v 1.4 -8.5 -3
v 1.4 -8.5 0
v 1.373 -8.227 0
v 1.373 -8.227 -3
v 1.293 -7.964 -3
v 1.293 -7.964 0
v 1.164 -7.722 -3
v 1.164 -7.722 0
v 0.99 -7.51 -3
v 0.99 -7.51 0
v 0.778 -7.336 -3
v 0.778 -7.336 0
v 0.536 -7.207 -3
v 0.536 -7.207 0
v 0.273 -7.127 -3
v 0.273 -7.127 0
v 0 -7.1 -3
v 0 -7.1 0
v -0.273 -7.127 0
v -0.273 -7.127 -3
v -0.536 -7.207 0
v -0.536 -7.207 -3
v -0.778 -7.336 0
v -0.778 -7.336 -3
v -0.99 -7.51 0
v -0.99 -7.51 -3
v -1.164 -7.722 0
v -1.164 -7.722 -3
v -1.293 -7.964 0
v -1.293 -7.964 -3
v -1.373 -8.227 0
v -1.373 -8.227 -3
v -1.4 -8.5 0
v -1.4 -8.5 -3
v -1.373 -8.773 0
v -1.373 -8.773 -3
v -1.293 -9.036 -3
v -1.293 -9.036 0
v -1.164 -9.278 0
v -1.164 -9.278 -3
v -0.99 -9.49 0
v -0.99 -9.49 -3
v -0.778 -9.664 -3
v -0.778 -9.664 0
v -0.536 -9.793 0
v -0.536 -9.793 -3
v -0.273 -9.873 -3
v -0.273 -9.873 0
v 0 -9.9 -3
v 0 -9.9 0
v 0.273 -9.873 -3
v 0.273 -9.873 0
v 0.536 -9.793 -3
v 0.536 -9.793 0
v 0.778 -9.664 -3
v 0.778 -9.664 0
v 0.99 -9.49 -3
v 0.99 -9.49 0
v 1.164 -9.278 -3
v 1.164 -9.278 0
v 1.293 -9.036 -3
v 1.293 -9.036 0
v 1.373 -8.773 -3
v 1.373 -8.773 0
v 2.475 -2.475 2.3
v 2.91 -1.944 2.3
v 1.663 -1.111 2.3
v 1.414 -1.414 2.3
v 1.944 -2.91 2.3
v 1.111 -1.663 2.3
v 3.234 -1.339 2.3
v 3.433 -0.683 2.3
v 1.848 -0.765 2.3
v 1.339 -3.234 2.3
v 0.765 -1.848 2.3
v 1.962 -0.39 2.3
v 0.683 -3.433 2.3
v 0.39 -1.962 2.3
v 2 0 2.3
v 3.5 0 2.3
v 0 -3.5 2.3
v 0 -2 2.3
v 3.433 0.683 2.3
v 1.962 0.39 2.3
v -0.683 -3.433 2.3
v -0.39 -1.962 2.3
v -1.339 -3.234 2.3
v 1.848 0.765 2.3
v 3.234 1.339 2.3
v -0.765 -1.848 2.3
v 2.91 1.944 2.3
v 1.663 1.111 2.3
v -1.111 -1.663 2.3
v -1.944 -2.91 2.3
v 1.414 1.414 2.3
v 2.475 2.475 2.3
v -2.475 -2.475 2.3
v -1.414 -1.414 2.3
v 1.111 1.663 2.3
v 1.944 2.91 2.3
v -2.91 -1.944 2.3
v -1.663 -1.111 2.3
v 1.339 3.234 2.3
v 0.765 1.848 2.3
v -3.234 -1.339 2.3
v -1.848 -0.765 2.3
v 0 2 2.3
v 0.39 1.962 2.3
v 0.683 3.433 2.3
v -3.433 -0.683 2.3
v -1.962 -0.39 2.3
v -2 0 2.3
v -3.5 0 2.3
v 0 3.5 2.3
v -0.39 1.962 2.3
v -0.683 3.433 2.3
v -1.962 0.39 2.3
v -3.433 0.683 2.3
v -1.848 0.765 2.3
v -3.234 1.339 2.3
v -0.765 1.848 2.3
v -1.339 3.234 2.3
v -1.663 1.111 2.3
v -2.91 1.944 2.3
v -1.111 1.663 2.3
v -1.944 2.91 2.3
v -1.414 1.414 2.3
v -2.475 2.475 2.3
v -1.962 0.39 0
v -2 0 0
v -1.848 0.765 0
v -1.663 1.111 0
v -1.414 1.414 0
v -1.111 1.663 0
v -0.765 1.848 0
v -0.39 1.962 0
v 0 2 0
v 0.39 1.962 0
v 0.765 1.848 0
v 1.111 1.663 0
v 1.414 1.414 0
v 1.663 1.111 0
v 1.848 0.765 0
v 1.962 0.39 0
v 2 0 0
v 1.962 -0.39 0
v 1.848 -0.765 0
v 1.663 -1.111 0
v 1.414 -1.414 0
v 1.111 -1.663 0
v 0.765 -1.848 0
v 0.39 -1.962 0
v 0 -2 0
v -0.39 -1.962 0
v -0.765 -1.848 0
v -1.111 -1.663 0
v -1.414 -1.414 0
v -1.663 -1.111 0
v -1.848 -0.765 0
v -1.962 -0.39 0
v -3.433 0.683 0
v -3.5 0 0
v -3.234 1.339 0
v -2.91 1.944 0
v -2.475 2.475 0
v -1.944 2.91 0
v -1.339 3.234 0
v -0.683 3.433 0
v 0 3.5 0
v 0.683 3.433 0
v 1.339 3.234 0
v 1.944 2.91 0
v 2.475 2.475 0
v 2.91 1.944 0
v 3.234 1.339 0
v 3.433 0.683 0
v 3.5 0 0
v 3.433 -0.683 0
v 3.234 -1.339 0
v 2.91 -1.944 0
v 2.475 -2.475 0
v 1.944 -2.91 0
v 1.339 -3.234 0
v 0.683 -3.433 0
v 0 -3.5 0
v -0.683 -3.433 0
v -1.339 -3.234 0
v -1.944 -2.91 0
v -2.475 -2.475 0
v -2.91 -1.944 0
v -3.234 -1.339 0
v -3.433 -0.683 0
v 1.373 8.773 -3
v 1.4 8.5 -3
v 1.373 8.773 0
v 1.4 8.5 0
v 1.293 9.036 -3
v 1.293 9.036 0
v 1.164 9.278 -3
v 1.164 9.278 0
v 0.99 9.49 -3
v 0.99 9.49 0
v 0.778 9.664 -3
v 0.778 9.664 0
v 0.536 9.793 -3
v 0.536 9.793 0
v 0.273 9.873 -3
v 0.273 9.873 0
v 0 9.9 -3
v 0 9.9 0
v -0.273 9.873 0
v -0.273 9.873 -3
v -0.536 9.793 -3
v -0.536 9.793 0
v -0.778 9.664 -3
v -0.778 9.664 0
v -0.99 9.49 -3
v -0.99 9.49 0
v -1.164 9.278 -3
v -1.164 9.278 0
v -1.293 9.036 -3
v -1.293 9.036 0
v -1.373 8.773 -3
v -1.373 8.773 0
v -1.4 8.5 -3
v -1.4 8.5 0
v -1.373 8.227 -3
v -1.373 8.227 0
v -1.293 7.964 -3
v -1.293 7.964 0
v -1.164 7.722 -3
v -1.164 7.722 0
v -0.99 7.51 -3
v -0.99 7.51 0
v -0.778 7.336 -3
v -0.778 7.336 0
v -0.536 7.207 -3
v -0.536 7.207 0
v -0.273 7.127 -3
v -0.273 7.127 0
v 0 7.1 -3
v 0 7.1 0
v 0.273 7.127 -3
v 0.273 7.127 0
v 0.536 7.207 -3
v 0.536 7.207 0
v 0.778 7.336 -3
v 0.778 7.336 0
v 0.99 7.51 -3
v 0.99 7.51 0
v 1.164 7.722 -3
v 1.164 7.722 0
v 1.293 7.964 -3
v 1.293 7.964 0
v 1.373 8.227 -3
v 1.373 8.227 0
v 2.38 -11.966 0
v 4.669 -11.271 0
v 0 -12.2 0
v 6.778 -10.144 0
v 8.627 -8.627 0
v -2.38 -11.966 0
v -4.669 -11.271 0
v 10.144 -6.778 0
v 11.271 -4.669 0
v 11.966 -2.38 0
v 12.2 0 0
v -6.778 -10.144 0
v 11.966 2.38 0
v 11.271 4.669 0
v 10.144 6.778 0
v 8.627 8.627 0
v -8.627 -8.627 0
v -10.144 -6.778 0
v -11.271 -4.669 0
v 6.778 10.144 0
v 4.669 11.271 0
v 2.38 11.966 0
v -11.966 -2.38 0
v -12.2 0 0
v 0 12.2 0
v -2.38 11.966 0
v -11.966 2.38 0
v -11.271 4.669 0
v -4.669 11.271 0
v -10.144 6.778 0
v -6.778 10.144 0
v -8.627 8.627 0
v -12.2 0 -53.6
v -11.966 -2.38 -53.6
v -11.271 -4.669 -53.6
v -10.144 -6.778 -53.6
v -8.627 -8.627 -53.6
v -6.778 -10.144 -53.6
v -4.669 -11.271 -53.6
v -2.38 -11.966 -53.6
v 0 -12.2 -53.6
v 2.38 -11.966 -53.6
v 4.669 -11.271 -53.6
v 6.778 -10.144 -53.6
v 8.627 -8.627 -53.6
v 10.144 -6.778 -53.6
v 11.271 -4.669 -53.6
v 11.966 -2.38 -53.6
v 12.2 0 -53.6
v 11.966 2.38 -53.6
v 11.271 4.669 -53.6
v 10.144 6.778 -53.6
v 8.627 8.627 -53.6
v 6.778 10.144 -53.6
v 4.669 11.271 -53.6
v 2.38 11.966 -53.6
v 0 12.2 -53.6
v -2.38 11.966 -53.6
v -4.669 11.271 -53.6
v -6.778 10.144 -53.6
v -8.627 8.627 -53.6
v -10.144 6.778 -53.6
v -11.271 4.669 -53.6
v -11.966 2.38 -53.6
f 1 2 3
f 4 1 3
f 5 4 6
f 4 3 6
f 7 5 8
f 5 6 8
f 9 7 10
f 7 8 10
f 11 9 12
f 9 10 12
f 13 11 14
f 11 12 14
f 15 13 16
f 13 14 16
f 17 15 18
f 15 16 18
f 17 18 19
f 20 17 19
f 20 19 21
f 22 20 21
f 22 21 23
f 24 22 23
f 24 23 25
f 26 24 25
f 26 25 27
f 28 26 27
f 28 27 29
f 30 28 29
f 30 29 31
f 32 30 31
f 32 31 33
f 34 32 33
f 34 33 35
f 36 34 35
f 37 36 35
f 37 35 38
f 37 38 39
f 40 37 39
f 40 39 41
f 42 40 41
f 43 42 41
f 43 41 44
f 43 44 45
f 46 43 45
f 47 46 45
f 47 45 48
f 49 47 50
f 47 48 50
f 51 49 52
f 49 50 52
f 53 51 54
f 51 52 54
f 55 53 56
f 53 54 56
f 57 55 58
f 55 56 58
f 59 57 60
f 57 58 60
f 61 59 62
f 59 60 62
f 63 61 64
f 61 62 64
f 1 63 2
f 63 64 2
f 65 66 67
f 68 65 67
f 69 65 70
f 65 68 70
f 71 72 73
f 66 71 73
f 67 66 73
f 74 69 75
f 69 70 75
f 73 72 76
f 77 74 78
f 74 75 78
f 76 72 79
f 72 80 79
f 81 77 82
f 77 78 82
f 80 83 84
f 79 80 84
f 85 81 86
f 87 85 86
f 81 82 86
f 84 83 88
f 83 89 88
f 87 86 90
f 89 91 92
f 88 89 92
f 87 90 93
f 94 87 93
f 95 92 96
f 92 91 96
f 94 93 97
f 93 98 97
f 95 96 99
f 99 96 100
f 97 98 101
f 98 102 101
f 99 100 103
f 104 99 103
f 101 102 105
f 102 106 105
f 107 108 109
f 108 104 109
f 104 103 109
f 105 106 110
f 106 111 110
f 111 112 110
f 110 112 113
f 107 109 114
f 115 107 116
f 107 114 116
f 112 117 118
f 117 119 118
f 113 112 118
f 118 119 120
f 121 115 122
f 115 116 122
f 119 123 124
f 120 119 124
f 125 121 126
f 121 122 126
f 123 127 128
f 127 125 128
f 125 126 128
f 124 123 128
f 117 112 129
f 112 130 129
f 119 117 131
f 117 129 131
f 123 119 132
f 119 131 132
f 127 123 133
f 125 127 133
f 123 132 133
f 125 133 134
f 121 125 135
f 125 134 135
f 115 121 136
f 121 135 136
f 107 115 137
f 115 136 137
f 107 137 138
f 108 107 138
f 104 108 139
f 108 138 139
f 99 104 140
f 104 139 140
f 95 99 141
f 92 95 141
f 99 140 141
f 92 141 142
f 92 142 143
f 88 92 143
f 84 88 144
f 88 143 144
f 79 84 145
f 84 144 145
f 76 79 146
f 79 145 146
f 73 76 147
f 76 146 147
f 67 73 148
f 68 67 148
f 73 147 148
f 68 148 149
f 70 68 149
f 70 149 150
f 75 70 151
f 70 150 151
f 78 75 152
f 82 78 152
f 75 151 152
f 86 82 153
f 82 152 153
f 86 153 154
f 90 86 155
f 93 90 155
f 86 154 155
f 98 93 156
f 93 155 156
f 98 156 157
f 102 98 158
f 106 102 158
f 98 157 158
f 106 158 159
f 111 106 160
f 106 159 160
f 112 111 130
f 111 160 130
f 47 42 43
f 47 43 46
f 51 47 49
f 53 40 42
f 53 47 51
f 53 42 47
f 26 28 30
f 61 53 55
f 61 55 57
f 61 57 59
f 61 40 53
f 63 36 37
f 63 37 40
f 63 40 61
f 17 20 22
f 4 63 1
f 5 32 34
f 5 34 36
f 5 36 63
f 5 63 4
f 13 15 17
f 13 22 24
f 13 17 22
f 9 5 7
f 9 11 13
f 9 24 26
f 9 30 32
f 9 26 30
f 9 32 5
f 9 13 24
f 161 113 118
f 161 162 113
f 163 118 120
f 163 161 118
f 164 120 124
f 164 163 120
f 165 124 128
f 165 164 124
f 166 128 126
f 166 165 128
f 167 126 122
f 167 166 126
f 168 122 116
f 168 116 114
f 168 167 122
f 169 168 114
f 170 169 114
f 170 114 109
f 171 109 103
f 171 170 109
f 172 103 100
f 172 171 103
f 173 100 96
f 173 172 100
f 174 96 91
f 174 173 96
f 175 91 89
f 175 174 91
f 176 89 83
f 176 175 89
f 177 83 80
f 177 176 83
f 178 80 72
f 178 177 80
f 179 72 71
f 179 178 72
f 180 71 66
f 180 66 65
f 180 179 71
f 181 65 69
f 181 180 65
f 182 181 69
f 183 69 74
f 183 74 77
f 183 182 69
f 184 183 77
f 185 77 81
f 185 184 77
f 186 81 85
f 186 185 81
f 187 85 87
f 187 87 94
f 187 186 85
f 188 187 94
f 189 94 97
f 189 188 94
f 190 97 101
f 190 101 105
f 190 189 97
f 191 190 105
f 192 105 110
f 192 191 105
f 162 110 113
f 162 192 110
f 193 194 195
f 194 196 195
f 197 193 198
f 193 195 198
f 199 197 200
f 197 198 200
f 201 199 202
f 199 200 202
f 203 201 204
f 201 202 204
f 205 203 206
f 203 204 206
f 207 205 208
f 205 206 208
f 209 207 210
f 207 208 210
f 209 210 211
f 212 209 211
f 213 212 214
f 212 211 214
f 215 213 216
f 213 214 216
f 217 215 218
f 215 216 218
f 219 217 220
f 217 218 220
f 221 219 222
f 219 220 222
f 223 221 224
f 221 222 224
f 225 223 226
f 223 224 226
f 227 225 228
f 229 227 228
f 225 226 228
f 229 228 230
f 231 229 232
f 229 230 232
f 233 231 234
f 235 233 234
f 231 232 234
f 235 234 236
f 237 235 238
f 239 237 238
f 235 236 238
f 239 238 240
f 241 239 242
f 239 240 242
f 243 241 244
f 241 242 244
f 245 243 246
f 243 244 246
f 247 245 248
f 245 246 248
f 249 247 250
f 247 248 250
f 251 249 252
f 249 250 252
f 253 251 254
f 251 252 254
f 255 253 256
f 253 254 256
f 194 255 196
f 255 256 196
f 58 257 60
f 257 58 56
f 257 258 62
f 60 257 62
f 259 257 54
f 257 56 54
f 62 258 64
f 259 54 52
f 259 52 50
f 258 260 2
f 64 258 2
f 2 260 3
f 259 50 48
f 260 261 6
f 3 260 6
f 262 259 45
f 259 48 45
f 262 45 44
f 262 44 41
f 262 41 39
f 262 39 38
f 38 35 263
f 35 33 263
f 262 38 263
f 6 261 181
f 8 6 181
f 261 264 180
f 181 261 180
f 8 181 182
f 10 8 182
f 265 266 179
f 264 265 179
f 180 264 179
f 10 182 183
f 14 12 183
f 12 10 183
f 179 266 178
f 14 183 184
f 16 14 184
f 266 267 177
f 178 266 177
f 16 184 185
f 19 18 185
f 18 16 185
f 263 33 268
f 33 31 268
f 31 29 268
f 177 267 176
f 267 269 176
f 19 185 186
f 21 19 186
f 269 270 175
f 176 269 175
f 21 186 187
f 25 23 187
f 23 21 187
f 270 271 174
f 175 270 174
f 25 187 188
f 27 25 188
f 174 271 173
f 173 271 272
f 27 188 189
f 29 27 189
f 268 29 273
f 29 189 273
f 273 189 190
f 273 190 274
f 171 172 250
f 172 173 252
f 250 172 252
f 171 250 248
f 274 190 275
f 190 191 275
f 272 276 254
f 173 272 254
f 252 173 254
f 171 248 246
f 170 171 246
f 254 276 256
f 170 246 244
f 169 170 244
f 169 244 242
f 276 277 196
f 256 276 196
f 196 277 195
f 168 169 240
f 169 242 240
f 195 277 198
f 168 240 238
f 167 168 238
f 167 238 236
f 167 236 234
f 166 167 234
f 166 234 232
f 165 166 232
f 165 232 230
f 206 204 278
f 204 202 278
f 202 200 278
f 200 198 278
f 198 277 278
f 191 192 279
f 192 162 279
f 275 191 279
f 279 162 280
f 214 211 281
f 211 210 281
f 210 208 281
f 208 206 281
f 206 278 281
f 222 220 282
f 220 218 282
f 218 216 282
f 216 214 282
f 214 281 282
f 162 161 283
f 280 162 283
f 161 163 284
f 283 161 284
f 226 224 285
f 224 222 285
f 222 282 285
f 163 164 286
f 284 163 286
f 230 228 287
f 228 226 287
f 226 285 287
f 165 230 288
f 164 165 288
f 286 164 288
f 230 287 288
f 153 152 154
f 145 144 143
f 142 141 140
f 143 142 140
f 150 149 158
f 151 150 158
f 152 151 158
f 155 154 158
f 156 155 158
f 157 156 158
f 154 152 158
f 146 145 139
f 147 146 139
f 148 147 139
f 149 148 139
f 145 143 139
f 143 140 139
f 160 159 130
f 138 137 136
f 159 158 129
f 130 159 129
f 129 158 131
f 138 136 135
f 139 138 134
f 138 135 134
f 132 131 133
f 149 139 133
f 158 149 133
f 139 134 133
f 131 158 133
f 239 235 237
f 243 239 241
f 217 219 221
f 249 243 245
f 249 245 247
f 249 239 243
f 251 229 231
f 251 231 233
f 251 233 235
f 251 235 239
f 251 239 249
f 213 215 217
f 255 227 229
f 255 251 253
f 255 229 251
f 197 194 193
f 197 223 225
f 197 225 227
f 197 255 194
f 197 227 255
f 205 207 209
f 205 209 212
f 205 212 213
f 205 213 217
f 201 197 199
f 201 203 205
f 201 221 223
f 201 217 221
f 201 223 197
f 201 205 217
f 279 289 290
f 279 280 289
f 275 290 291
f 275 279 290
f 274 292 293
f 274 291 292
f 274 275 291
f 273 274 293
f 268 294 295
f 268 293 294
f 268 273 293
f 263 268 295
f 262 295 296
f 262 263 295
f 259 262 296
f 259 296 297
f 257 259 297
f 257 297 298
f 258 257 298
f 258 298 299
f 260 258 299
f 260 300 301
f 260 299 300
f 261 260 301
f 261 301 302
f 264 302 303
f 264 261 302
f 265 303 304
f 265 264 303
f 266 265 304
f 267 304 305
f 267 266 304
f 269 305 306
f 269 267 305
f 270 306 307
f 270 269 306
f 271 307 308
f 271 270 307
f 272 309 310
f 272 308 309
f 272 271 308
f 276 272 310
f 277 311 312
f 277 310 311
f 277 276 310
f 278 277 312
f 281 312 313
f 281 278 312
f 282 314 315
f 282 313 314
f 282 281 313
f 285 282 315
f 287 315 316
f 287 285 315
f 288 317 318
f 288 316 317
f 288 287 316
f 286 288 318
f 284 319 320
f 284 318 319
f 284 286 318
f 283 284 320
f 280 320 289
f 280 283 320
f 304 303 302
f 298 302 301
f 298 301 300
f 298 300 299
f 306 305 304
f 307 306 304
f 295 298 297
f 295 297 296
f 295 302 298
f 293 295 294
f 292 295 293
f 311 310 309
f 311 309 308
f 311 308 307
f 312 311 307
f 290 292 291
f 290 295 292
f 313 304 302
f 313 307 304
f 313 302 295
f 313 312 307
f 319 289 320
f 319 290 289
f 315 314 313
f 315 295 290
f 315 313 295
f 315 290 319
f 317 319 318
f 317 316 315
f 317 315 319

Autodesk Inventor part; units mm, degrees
ref_plane "YZ Plane" through (0, 0, 0) normal (1, 0, 0) x (0, 1, 0)
ref_plane "XZ Plane" through (0, 0, 0) normal (0, 1, 0) x (-1, 0, 0)
ref_plane "XY Plane" through (0, 0, 0) normal (0, 0, 1) x (1, 0, 0)
sketch "草圖1" plane through (0, 0, 0) normal (0, 1, 0) x (-1, 0, 0)
  line L0 (12.2, 0) -> (-12.2, 0)
  line L1 (-12.2, 0) -> (-12.2, -53.6)
  line L2 (-12.2, -53.6) -> (12.2, -53.6)
  line L3 (12.2, -53.6) -> (12.2, 0)
  line L4 (2, 0) -> (-2, 0)
  line L5 (-2, 0) -> (-2, 12)
  line L6 (-2, 12) -> (2, 12)
  line L7 (2, 12) -> (2, 0)
  line L8 (3.5, 0) -> (-3.5, 0)
  line L9 (-3.5, 0) -> (-3.5, 2.3)
  line L10 (-3.5, 2.3) -> (3.5, 2.3)
  line L11 (3.5, 2.3) -> (3.5, 0)
  line L12 (2, 4) -> (-2, 4)
  line L13 (8.5, 0) -> (8.5, -53.6)
  line L14 (-8.5, 0) -> (-8.5, -53.6)
  line L15 (0, 0) -> (0, -53.6)
  line L16 (0, 0) -> (0, 12)
  point P0 (-8.5, -26.8)
  point P1 (0, 2.3)
  point P2 (2, 2.3)
  dimension "d1" = 8
  dimension "d2" = 9.7
  dimension "d4" = 17
  dimension "d5" = 24.4
  dimension "d6" = 53.6
  dimension "d7" = 3.7
  dimension "d8" = 4
  dimension "d9" = 7
  dimension "d10" = 2.3
revolve "迴轉1" add sketch "草圖1" angle 360 about axis through (0, 0, 0) along (0, 0, -1) contours L3 L2 L13 L0 | L13 L2 L15 L0 | L0 L7 L10 L11
sketch "草圖4" plane through (0, 0, 0) normal (0, 0, 1) x (1, 0, 0)
  circle A0 centre (0, 0) radius 8.5
  circle A1 centre (0, 8.5) radius 1.4
  circle A2 centre (0, -8.5) radius 1.4
  dimension "d21" = 17
  dimension "d22" = 2.8
  dimension "d23" = 2.8
extrude "擠出3" cut sketch "草圖4" against normal blind 3 contours A1 A0 | A0 A1 | A2 A0 | A0 A2
properties part number "馬達" material "鋁合金 6061"
